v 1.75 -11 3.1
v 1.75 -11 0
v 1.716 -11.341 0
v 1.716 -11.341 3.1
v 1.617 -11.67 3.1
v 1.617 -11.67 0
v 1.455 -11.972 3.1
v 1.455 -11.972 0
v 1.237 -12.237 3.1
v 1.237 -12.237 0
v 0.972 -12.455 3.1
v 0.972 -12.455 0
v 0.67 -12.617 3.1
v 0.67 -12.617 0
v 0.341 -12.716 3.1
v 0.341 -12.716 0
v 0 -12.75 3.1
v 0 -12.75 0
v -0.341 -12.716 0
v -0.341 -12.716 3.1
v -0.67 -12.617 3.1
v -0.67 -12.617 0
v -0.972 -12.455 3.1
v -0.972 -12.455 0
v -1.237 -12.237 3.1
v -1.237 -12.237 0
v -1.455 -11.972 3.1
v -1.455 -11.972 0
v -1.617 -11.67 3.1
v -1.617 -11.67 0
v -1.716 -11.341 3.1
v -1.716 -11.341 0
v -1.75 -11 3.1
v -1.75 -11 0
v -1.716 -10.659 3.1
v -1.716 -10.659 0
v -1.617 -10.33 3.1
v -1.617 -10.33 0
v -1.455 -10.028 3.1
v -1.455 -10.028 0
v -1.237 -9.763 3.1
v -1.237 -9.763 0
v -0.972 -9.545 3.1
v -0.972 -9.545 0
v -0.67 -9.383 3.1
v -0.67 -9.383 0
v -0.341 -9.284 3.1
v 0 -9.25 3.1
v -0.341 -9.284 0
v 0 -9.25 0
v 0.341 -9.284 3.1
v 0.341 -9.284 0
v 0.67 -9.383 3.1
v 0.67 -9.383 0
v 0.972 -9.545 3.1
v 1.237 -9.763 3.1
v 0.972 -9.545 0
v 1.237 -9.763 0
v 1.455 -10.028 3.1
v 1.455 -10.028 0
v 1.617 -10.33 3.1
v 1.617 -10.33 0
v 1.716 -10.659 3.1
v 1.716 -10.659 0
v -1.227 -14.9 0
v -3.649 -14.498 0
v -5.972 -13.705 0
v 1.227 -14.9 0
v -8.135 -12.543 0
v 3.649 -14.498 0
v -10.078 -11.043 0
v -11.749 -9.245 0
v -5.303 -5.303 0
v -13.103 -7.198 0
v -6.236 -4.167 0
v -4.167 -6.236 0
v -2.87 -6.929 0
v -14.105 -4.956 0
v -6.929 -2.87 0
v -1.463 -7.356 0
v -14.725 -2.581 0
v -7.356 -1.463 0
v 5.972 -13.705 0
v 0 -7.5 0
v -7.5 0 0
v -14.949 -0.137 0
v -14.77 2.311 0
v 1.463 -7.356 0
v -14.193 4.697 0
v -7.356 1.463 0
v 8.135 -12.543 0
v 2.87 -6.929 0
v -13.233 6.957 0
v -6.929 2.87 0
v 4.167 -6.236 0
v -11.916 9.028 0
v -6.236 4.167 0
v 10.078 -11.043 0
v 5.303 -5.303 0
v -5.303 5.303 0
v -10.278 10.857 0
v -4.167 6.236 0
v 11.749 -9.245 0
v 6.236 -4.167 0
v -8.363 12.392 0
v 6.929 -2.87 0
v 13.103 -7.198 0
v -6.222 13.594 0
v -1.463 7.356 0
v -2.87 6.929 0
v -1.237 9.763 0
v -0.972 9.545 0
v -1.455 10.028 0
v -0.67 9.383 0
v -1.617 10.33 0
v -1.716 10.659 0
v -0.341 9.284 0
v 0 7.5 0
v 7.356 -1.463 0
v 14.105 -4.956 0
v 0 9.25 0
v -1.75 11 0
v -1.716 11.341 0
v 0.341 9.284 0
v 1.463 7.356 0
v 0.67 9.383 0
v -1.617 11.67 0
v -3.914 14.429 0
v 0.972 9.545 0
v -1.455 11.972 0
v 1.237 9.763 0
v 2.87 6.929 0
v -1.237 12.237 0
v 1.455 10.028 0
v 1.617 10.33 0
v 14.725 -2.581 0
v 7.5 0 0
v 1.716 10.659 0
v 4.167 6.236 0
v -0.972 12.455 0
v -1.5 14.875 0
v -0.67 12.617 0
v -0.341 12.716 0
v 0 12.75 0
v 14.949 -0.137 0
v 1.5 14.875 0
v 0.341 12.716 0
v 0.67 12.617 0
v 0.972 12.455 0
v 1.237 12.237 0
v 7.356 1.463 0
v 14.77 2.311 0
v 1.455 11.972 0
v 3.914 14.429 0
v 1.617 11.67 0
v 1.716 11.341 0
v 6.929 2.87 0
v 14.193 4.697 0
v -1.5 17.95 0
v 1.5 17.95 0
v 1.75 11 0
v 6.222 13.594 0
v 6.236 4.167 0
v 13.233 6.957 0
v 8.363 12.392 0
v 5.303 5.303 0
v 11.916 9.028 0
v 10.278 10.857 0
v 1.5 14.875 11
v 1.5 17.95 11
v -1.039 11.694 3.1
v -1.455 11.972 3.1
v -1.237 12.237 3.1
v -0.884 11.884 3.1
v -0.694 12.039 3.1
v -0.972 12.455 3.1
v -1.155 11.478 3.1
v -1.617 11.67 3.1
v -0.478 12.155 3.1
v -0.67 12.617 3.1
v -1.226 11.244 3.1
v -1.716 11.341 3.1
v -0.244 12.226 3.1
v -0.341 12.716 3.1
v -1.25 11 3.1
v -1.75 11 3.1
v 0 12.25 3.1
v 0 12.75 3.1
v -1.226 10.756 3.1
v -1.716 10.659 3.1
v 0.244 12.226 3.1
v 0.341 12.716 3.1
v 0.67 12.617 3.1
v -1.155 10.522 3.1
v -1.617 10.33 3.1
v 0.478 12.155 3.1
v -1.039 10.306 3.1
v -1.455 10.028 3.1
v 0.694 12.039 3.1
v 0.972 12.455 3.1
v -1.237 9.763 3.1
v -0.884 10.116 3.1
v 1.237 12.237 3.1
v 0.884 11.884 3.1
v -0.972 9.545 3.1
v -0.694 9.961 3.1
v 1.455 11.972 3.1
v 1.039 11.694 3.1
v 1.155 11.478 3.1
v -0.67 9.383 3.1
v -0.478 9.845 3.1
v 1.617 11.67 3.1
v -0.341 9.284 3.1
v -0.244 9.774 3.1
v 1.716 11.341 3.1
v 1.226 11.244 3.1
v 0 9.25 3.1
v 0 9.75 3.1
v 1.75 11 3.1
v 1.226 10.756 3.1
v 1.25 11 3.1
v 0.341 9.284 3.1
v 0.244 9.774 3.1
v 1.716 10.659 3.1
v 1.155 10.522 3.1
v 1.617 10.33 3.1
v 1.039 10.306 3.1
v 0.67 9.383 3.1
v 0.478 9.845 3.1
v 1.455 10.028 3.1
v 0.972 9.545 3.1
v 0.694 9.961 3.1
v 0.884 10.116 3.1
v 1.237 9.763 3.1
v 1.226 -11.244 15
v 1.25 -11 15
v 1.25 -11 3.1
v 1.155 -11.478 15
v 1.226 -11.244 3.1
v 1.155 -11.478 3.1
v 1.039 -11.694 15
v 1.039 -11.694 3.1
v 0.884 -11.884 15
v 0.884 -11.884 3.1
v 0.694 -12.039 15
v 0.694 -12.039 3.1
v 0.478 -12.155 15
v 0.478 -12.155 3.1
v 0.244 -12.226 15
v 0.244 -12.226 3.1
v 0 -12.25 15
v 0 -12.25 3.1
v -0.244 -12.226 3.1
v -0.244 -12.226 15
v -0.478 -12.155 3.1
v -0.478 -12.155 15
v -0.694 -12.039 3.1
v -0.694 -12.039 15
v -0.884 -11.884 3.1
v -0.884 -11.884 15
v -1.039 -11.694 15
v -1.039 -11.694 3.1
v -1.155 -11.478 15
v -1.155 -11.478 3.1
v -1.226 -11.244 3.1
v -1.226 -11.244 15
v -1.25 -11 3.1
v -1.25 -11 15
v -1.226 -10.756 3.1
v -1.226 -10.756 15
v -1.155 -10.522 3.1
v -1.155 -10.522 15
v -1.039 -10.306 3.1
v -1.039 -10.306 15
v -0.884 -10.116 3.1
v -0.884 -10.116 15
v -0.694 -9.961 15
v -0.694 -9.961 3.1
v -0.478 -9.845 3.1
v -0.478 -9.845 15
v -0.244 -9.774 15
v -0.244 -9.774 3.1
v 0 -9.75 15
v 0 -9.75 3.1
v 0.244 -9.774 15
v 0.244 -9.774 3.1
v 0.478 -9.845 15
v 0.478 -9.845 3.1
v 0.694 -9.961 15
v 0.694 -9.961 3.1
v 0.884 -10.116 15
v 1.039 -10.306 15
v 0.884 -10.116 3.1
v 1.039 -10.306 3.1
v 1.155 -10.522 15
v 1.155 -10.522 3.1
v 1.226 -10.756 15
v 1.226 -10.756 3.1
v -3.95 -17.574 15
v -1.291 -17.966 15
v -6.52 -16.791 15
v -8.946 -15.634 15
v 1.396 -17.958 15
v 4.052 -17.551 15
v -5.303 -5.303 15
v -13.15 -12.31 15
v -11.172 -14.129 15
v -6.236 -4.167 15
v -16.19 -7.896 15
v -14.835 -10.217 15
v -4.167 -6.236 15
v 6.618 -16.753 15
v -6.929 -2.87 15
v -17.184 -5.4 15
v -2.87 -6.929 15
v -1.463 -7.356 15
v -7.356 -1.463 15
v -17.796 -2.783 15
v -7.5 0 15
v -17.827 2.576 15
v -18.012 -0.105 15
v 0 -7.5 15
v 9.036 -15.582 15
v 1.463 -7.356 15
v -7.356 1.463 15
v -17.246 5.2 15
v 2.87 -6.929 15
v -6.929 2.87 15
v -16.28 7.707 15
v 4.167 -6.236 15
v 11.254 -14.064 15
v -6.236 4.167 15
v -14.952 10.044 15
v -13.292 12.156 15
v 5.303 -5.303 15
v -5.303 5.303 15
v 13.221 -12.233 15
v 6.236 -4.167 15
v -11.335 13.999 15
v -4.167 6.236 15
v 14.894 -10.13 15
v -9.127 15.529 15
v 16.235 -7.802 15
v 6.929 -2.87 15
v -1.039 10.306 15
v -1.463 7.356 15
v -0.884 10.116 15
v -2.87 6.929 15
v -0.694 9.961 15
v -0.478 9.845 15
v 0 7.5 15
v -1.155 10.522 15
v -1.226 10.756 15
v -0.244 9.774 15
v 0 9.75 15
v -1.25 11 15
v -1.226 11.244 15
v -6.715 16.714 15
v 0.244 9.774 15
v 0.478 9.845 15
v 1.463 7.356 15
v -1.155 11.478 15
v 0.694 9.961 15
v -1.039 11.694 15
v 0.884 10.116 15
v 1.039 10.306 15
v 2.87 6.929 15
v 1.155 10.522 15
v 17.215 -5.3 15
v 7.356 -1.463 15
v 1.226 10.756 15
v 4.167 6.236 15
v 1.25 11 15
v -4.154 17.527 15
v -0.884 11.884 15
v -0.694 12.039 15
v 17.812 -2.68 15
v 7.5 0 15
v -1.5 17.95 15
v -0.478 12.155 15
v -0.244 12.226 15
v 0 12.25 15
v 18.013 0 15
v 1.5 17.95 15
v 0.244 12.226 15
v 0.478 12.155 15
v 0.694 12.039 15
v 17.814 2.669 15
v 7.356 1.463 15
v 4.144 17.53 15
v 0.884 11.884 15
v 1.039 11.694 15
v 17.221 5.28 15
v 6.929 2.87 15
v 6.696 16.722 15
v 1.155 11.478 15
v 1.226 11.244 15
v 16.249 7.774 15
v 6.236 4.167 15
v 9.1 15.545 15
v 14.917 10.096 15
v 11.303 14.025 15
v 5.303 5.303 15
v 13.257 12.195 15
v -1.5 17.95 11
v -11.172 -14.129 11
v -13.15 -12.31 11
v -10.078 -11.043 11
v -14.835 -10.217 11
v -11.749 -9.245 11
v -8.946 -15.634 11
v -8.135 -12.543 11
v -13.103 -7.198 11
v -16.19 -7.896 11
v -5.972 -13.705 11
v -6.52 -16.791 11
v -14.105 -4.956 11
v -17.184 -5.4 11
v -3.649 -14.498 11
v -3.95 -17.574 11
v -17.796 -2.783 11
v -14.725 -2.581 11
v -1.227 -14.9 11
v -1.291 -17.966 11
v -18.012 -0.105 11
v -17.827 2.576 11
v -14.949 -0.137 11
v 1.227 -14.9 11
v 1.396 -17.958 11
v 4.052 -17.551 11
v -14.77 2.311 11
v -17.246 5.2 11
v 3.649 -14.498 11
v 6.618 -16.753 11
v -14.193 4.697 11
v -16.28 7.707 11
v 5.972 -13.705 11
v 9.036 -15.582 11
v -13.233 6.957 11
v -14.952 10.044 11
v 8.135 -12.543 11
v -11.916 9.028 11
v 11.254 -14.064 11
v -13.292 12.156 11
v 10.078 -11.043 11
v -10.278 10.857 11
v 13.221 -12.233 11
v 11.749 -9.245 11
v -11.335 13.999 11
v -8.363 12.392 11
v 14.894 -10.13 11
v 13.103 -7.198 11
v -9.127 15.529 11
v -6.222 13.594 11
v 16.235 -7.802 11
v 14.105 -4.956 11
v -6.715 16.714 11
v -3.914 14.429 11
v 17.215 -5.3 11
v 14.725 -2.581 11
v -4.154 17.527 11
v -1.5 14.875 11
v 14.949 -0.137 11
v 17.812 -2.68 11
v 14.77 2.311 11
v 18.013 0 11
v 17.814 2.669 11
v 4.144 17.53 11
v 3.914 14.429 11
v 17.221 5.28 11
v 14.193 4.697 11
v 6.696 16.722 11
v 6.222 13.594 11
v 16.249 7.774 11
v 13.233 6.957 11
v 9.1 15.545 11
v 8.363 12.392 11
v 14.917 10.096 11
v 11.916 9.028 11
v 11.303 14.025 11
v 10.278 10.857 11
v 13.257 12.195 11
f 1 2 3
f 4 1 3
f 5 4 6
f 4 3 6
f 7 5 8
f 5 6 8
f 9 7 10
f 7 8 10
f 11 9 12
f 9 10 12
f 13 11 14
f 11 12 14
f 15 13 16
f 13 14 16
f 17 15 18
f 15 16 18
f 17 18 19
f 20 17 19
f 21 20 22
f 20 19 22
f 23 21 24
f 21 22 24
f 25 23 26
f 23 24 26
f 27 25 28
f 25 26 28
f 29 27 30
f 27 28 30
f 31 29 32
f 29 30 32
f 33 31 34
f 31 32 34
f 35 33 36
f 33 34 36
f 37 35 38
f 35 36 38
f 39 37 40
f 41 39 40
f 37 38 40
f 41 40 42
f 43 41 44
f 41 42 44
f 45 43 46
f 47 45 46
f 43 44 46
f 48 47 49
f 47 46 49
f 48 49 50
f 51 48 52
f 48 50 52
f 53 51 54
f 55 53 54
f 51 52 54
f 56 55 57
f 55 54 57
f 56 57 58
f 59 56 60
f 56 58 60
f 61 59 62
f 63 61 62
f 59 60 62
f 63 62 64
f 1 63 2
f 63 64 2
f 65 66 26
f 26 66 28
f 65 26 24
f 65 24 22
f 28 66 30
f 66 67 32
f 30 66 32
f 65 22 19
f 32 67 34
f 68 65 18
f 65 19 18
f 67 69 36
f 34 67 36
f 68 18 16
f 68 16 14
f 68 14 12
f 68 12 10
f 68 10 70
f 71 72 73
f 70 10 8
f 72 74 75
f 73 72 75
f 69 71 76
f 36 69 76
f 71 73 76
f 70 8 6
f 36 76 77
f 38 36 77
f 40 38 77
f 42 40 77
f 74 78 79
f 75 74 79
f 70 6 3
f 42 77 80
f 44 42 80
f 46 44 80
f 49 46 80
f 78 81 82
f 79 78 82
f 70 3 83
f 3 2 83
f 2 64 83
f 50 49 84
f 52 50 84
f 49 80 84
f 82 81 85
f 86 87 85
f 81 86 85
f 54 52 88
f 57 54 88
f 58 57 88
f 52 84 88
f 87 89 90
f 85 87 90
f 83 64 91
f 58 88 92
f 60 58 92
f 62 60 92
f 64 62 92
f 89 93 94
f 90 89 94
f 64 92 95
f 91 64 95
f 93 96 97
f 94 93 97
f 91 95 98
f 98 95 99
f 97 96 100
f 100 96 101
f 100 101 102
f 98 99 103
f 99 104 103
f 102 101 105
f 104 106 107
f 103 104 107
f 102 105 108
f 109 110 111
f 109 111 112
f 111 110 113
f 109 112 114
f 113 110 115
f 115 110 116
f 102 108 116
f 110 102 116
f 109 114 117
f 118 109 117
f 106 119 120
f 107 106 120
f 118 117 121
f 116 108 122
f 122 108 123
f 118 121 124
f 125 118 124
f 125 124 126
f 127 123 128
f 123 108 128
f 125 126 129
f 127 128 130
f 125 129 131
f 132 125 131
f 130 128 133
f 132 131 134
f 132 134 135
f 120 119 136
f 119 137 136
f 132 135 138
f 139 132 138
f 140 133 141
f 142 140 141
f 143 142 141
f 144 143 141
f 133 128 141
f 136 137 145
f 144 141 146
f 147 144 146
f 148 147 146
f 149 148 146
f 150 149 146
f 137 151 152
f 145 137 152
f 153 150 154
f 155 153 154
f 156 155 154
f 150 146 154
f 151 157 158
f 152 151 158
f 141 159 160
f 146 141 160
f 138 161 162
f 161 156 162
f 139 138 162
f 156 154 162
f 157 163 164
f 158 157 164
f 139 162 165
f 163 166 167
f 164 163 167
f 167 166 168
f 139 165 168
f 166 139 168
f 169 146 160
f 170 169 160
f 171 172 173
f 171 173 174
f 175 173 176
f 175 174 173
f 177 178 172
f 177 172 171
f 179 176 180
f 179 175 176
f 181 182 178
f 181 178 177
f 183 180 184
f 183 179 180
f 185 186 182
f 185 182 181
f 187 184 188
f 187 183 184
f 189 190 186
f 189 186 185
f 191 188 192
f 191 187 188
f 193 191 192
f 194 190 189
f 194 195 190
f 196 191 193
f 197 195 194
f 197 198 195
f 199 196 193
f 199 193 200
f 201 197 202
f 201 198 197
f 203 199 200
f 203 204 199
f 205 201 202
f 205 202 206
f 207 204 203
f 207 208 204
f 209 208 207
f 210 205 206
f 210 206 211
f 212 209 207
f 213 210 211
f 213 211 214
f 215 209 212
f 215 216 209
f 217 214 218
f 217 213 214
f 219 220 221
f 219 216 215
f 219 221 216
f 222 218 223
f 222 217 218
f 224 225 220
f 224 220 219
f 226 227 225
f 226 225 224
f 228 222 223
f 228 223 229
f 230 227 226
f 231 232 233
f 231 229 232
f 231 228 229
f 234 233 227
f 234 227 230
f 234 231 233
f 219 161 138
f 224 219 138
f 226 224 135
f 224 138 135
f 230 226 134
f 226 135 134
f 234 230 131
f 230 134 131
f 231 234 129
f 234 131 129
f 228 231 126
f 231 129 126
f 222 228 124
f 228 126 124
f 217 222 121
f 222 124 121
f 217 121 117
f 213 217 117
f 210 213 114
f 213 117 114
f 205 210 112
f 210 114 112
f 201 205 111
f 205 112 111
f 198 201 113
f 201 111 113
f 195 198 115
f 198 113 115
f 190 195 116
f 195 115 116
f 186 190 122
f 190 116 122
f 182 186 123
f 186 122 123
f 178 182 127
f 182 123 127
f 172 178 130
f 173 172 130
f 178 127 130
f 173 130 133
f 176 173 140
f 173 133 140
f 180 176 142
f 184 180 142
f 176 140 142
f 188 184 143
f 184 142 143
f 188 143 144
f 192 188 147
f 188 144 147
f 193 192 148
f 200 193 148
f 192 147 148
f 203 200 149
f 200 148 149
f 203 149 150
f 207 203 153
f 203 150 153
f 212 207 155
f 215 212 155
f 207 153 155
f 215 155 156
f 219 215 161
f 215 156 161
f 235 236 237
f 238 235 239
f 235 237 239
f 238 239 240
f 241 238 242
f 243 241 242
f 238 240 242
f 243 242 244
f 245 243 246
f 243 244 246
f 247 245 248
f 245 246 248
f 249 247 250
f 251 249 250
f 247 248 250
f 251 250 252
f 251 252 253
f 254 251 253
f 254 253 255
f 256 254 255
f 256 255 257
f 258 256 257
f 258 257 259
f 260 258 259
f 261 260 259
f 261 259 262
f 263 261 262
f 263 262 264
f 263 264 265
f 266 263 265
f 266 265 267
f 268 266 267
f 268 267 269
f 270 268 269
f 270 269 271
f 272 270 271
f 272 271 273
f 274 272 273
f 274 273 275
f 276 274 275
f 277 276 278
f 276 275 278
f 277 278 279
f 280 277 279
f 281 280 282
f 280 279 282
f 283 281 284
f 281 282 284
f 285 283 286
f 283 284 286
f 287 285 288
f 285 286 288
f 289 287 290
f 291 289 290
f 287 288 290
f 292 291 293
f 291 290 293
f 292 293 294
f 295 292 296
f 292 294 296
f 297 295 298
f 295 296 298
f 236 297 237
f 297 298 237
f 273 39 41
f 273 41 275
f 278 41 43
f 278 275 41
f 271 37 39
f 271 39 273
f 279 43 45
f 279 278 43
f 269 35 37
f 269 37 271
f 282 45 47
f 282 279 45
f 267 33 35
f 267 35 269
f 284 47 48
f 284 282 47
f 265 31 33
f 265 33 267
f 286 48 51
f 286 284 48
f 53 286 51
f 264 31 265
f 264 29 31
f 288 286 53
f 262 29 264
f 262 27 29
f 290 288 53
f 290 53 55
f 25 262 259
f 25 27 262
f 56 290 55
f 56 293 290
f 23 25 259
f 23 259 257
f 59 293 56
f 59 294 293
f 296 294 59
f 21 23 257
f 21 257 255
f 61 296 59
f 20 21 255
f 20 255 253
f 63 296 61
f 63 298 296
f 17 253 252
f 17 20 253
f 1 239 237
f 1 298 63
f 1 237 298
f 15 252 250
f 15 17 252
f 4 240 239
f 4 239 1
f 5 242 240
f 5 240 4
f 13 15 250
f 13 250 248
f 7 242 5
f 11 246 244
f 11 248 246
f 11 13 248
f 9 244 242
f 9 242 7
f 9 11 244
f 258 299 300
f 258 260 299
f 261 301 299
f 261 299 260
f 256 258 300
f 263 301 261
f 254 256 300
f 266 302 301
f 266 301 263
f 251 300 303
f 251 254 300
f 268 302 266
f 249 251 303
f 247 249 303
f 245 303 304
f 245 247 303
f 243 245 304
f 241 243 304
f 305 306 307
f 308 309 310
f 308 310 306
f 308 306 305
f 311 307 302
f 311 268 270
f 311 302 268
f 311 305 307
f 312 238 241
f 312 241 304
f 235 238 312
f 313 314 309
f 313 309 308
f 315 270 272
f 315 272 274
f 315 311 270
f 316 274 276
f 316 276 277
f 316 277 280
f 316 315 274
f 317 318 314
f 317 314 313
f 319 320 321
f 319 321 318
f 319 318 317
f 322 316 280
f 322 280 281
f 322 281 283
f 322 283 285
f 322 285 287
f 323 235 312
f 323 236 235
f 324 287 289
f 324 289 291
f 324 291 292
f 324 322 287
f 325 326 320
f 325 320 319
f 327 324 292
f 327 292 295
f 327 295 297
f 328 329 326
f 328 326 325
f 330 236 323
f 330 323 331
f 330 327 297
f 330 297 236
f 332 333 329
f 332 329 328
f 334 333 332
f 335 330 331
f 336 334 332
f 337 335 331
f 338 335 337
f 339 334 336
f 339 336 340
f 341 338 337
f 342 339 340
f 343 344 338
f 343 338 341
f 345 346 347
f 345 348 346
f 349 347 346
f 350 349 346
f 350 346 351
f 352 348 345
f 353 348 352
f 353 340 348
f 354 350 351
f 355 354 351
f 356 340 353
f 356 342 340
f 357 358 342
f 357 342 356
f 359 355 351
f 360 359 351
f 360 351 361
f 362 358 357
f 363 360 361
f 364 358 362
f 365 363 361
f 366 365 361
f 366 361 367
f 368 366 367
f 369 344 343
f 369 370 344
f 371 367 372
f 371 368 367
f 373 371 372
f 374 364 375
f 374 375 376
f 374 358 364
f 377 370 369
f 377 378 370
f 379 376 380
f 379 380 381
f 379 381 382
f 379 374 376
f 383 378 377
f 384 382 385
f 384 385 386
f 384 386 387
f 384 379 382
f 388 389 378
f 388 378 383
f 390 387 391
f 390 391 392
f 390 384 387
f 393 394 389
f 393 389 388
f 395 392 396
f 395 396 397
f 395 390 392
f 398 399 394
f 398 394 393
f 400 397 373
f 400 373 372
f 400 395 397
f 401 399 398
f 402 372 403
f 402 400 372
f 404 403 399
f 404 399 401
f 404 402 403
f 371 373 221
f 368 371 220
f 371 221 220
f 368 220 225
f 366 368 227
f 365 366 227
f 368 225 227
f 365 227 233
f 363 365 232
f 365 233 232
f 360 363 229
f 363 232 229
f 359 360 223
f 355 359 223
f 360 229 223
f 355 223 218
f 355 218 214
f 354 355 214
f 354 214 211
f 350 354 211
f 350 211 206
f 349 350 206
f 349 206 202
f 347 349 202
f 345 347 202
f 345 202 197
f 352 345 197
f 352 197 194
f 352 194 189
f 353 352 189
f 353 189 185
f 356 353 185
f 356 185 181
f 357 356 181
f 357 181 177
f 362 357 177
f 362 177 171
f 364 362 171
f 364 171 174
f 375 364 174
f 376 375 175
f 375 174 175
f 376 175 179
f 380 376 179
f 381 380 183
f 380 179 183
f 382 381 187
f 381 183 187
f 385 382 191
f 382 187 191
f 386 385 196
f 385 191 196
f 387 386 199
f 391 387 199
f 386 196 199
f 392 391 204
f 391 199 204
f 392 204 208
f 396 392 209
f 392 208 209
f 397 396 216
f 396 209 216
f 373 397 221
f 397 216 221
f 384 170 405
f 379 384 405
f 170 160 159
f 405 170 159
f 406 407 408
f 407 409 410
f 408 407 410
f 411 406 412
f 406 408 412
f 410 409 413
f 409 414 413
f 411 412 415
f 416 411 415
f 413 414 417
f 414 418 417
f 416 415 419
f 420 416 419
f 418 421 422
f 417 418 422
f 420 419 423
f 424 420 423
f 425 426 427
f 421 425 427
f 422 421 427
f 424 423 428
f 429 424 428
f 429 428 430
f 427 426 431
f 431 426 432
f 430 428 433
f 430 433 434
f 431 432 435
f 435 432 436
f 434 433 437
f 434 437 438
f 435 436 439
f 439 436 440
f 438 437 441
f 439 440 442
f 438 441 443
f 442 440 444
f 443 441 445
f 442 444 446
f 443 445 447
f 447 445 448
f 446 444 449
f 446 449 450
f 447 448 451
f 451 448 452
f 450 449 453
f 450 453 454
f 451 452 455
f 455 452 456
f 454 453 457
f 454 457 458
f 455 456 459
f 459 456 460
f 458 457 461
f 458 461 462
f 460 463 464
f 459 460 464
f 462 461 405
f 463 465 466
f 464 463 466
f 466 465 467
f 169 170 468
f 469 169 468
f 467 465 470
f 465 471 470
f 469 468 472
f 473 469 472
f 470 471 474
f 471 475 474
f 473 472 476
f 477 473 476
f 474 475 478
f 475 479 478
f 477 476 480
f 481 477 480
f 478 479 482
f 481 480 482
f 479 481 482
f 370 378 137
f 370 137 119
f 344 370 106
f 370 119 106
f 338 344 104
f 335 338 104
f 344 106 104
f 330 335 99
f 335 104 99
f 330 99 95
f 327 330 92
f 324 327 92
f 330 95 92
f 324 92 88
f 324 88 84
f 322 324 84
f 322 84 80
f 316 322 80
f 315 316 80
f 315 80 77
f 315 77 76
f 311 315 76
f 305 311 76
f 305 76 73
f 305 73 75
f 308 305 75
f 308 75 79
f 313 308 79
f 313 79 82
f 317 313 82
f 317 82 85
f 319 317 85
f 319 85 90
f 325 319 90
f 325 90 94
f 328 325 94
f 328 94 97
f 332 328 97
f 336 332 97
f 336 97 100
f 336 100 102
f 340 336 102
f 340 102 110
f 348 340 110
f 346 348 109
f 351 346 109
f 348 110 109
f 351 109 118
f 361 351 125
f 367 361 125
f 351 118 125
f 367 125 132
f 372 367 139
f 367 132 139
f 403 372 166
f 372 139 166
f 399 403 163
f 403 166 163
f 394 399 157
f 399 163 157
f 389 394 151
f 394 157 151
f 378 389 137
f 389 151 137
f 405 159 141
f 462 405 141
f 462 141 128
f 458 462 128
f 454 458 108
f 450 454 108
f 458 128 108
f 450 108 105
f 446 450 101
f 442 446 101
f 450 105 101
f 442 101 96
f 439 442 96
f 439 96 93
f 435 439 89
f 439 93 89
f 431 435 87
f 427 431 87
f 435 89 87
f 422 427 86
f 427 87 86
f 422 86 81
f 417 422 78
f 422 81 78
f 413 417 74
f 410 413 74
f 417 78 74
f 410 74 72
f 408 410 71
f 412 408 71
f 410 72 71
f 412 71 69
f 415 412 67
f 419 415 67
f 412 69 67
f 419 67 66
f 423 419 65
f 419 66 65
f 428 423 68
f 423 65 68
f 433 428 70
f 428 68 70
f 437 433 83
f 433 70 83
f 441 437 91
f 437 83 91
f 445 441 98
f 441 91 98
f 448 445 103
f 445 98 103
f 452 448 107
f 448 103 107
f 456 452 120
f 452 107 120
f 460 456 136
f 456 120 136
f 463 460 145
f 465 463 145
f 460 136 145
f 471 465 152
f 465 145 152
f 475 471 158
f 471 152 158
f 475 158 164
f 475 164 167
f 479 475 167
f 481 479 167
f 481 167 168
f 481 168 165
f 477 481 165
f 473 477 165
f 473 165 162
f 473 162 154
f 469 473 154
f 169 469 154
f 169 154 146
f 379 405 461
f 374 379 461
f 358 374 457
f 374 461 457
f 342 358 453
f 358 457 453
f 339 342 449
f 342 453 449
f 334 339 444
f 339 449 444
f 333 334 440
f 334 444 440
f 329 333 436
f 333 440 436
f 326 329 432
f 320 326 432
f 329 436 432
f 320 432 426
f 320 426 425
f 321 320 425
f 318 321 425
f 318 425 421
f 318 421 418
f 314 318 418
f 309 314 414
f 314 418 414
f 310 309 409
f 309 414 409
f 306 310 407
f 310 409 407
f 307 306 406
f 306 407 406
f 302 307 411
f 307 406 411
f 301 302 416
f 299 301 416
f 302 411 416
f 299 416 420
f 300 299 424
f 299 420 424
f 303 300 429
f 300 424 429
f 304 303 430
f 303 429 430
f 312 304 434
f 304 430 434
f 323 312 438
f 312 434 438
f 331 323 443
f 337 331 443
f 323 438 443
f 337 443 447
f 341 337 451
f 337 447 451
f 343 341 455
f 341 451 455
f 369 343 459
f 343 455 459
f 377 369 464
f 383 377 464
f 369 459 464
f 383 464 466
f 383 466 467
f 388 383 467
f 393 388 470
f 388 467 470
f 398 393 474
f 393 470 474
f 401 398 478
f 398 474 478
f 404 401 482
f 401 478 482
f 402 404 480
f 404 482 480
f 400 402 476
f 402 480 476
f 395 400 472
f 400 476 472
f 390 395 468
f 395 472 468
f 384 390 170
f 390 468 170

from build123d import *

# Parameters (mm, degrees)
F1_DEPTH = 11
F3_DEPTH = 4
F4_R     = 7.5
F5_DEPTH = 25
F6_R     = 1.25
F7_DEPTH = 25
F6_R_2   = 1.75
F8_DEPTH = 3.1


with BuildPart() as f1:
    # F0 (on Top) → F1 (new body)
    with BuildSketch(Plane.XY):
        with BuildLine():
            Line((-1.5, 17.95), (-1.5, 14.874559))
            ThreePointArc((-1.5, 14.874559), (0, -14.95), (1.5, 14.874559))
            Line((1.5, 14.874559), (1.5, 17.95))
            Line((1.5, 17.95), (-1.5, 17.95))
        make_face()
    extrude(amount=F1_DEPTH)

    # F2 (on face) → F3 (join)
    with BuildSketch(Plane.XY.offset(11)):
        with BuildLine():
            ThreePointArc((-1.5, 17.95), (-12.194951, -13.256533), (18.012565, 0))
            ThreePointArc((18.012565, 0), (13.256533, 12.194951), (1.5, 17.95))
            Line((1.5, 17.95), (1.5, 14.874559))
            ThreePointArc((1.5, 14.874559), (0, -14.95), (-1.5, 14.874559))
            Line((-1.5, 14.874559), (-1.5, 17.95))
        make_face()
        with BuildLine():
            Line((1.5, 14.874559), (1.5, 17.95))
            Line((1.5, 17.95), (-1.5, 17.95))
            Line((-1.5, 17.95), (-1.5, 14.874559))
            ThreePointArc((-1.5, 14.874559), (0, -14.95), (1.5, 14.874559))
        make_face()
    extrude(amount=F3_DEPTH)

    # F4 (on face) → F5 (cut)
    with BuildSketch(Plane(origin=(0, 0, 0), x_dir=(1, 0, 0), z_dir=(0, 0, -1))):
        Circle(F4_R)
    extrude(amount=-F5_DEPTH, mode=Mode.SUBTRACT)

    # F6 (on face) → F7 (cut)
    with BuildSketch(Plane(origin=(0, 0, 0), x_dir=(1, 0, 0), z_dir=(0, 0, -1))):
        with Locations((0, -11)):
            Circle(F6_R)
        with Locations((0, 11)):
            Circle(F6_R)
    extrude(amount=-F7_DEPTH, mode=Mode.SUBTRACT)

    # F6 (on face) → F8 (cut)
    with BuildSketch(Plane(origin=(0, 0, 0), x_dir=(1, 0, 0), z_dir=(0, 0, -1))):
        with Locations((0, 11)):
            Circle(F6_R_2)
        with Locations((0, 11)):
            Circle(F6_R, mode=Mode.SUBTRACT)
        with Locations((0, -11)):
            Circle(F6_R_2)
        with Locations((0, -11)):
            Circle(F6_R, mode=Mode.SUBTRACT)
    extrude(amount=-F8_DEPTH, mode=Mode.SUBTRACT)


solid = f1.part
